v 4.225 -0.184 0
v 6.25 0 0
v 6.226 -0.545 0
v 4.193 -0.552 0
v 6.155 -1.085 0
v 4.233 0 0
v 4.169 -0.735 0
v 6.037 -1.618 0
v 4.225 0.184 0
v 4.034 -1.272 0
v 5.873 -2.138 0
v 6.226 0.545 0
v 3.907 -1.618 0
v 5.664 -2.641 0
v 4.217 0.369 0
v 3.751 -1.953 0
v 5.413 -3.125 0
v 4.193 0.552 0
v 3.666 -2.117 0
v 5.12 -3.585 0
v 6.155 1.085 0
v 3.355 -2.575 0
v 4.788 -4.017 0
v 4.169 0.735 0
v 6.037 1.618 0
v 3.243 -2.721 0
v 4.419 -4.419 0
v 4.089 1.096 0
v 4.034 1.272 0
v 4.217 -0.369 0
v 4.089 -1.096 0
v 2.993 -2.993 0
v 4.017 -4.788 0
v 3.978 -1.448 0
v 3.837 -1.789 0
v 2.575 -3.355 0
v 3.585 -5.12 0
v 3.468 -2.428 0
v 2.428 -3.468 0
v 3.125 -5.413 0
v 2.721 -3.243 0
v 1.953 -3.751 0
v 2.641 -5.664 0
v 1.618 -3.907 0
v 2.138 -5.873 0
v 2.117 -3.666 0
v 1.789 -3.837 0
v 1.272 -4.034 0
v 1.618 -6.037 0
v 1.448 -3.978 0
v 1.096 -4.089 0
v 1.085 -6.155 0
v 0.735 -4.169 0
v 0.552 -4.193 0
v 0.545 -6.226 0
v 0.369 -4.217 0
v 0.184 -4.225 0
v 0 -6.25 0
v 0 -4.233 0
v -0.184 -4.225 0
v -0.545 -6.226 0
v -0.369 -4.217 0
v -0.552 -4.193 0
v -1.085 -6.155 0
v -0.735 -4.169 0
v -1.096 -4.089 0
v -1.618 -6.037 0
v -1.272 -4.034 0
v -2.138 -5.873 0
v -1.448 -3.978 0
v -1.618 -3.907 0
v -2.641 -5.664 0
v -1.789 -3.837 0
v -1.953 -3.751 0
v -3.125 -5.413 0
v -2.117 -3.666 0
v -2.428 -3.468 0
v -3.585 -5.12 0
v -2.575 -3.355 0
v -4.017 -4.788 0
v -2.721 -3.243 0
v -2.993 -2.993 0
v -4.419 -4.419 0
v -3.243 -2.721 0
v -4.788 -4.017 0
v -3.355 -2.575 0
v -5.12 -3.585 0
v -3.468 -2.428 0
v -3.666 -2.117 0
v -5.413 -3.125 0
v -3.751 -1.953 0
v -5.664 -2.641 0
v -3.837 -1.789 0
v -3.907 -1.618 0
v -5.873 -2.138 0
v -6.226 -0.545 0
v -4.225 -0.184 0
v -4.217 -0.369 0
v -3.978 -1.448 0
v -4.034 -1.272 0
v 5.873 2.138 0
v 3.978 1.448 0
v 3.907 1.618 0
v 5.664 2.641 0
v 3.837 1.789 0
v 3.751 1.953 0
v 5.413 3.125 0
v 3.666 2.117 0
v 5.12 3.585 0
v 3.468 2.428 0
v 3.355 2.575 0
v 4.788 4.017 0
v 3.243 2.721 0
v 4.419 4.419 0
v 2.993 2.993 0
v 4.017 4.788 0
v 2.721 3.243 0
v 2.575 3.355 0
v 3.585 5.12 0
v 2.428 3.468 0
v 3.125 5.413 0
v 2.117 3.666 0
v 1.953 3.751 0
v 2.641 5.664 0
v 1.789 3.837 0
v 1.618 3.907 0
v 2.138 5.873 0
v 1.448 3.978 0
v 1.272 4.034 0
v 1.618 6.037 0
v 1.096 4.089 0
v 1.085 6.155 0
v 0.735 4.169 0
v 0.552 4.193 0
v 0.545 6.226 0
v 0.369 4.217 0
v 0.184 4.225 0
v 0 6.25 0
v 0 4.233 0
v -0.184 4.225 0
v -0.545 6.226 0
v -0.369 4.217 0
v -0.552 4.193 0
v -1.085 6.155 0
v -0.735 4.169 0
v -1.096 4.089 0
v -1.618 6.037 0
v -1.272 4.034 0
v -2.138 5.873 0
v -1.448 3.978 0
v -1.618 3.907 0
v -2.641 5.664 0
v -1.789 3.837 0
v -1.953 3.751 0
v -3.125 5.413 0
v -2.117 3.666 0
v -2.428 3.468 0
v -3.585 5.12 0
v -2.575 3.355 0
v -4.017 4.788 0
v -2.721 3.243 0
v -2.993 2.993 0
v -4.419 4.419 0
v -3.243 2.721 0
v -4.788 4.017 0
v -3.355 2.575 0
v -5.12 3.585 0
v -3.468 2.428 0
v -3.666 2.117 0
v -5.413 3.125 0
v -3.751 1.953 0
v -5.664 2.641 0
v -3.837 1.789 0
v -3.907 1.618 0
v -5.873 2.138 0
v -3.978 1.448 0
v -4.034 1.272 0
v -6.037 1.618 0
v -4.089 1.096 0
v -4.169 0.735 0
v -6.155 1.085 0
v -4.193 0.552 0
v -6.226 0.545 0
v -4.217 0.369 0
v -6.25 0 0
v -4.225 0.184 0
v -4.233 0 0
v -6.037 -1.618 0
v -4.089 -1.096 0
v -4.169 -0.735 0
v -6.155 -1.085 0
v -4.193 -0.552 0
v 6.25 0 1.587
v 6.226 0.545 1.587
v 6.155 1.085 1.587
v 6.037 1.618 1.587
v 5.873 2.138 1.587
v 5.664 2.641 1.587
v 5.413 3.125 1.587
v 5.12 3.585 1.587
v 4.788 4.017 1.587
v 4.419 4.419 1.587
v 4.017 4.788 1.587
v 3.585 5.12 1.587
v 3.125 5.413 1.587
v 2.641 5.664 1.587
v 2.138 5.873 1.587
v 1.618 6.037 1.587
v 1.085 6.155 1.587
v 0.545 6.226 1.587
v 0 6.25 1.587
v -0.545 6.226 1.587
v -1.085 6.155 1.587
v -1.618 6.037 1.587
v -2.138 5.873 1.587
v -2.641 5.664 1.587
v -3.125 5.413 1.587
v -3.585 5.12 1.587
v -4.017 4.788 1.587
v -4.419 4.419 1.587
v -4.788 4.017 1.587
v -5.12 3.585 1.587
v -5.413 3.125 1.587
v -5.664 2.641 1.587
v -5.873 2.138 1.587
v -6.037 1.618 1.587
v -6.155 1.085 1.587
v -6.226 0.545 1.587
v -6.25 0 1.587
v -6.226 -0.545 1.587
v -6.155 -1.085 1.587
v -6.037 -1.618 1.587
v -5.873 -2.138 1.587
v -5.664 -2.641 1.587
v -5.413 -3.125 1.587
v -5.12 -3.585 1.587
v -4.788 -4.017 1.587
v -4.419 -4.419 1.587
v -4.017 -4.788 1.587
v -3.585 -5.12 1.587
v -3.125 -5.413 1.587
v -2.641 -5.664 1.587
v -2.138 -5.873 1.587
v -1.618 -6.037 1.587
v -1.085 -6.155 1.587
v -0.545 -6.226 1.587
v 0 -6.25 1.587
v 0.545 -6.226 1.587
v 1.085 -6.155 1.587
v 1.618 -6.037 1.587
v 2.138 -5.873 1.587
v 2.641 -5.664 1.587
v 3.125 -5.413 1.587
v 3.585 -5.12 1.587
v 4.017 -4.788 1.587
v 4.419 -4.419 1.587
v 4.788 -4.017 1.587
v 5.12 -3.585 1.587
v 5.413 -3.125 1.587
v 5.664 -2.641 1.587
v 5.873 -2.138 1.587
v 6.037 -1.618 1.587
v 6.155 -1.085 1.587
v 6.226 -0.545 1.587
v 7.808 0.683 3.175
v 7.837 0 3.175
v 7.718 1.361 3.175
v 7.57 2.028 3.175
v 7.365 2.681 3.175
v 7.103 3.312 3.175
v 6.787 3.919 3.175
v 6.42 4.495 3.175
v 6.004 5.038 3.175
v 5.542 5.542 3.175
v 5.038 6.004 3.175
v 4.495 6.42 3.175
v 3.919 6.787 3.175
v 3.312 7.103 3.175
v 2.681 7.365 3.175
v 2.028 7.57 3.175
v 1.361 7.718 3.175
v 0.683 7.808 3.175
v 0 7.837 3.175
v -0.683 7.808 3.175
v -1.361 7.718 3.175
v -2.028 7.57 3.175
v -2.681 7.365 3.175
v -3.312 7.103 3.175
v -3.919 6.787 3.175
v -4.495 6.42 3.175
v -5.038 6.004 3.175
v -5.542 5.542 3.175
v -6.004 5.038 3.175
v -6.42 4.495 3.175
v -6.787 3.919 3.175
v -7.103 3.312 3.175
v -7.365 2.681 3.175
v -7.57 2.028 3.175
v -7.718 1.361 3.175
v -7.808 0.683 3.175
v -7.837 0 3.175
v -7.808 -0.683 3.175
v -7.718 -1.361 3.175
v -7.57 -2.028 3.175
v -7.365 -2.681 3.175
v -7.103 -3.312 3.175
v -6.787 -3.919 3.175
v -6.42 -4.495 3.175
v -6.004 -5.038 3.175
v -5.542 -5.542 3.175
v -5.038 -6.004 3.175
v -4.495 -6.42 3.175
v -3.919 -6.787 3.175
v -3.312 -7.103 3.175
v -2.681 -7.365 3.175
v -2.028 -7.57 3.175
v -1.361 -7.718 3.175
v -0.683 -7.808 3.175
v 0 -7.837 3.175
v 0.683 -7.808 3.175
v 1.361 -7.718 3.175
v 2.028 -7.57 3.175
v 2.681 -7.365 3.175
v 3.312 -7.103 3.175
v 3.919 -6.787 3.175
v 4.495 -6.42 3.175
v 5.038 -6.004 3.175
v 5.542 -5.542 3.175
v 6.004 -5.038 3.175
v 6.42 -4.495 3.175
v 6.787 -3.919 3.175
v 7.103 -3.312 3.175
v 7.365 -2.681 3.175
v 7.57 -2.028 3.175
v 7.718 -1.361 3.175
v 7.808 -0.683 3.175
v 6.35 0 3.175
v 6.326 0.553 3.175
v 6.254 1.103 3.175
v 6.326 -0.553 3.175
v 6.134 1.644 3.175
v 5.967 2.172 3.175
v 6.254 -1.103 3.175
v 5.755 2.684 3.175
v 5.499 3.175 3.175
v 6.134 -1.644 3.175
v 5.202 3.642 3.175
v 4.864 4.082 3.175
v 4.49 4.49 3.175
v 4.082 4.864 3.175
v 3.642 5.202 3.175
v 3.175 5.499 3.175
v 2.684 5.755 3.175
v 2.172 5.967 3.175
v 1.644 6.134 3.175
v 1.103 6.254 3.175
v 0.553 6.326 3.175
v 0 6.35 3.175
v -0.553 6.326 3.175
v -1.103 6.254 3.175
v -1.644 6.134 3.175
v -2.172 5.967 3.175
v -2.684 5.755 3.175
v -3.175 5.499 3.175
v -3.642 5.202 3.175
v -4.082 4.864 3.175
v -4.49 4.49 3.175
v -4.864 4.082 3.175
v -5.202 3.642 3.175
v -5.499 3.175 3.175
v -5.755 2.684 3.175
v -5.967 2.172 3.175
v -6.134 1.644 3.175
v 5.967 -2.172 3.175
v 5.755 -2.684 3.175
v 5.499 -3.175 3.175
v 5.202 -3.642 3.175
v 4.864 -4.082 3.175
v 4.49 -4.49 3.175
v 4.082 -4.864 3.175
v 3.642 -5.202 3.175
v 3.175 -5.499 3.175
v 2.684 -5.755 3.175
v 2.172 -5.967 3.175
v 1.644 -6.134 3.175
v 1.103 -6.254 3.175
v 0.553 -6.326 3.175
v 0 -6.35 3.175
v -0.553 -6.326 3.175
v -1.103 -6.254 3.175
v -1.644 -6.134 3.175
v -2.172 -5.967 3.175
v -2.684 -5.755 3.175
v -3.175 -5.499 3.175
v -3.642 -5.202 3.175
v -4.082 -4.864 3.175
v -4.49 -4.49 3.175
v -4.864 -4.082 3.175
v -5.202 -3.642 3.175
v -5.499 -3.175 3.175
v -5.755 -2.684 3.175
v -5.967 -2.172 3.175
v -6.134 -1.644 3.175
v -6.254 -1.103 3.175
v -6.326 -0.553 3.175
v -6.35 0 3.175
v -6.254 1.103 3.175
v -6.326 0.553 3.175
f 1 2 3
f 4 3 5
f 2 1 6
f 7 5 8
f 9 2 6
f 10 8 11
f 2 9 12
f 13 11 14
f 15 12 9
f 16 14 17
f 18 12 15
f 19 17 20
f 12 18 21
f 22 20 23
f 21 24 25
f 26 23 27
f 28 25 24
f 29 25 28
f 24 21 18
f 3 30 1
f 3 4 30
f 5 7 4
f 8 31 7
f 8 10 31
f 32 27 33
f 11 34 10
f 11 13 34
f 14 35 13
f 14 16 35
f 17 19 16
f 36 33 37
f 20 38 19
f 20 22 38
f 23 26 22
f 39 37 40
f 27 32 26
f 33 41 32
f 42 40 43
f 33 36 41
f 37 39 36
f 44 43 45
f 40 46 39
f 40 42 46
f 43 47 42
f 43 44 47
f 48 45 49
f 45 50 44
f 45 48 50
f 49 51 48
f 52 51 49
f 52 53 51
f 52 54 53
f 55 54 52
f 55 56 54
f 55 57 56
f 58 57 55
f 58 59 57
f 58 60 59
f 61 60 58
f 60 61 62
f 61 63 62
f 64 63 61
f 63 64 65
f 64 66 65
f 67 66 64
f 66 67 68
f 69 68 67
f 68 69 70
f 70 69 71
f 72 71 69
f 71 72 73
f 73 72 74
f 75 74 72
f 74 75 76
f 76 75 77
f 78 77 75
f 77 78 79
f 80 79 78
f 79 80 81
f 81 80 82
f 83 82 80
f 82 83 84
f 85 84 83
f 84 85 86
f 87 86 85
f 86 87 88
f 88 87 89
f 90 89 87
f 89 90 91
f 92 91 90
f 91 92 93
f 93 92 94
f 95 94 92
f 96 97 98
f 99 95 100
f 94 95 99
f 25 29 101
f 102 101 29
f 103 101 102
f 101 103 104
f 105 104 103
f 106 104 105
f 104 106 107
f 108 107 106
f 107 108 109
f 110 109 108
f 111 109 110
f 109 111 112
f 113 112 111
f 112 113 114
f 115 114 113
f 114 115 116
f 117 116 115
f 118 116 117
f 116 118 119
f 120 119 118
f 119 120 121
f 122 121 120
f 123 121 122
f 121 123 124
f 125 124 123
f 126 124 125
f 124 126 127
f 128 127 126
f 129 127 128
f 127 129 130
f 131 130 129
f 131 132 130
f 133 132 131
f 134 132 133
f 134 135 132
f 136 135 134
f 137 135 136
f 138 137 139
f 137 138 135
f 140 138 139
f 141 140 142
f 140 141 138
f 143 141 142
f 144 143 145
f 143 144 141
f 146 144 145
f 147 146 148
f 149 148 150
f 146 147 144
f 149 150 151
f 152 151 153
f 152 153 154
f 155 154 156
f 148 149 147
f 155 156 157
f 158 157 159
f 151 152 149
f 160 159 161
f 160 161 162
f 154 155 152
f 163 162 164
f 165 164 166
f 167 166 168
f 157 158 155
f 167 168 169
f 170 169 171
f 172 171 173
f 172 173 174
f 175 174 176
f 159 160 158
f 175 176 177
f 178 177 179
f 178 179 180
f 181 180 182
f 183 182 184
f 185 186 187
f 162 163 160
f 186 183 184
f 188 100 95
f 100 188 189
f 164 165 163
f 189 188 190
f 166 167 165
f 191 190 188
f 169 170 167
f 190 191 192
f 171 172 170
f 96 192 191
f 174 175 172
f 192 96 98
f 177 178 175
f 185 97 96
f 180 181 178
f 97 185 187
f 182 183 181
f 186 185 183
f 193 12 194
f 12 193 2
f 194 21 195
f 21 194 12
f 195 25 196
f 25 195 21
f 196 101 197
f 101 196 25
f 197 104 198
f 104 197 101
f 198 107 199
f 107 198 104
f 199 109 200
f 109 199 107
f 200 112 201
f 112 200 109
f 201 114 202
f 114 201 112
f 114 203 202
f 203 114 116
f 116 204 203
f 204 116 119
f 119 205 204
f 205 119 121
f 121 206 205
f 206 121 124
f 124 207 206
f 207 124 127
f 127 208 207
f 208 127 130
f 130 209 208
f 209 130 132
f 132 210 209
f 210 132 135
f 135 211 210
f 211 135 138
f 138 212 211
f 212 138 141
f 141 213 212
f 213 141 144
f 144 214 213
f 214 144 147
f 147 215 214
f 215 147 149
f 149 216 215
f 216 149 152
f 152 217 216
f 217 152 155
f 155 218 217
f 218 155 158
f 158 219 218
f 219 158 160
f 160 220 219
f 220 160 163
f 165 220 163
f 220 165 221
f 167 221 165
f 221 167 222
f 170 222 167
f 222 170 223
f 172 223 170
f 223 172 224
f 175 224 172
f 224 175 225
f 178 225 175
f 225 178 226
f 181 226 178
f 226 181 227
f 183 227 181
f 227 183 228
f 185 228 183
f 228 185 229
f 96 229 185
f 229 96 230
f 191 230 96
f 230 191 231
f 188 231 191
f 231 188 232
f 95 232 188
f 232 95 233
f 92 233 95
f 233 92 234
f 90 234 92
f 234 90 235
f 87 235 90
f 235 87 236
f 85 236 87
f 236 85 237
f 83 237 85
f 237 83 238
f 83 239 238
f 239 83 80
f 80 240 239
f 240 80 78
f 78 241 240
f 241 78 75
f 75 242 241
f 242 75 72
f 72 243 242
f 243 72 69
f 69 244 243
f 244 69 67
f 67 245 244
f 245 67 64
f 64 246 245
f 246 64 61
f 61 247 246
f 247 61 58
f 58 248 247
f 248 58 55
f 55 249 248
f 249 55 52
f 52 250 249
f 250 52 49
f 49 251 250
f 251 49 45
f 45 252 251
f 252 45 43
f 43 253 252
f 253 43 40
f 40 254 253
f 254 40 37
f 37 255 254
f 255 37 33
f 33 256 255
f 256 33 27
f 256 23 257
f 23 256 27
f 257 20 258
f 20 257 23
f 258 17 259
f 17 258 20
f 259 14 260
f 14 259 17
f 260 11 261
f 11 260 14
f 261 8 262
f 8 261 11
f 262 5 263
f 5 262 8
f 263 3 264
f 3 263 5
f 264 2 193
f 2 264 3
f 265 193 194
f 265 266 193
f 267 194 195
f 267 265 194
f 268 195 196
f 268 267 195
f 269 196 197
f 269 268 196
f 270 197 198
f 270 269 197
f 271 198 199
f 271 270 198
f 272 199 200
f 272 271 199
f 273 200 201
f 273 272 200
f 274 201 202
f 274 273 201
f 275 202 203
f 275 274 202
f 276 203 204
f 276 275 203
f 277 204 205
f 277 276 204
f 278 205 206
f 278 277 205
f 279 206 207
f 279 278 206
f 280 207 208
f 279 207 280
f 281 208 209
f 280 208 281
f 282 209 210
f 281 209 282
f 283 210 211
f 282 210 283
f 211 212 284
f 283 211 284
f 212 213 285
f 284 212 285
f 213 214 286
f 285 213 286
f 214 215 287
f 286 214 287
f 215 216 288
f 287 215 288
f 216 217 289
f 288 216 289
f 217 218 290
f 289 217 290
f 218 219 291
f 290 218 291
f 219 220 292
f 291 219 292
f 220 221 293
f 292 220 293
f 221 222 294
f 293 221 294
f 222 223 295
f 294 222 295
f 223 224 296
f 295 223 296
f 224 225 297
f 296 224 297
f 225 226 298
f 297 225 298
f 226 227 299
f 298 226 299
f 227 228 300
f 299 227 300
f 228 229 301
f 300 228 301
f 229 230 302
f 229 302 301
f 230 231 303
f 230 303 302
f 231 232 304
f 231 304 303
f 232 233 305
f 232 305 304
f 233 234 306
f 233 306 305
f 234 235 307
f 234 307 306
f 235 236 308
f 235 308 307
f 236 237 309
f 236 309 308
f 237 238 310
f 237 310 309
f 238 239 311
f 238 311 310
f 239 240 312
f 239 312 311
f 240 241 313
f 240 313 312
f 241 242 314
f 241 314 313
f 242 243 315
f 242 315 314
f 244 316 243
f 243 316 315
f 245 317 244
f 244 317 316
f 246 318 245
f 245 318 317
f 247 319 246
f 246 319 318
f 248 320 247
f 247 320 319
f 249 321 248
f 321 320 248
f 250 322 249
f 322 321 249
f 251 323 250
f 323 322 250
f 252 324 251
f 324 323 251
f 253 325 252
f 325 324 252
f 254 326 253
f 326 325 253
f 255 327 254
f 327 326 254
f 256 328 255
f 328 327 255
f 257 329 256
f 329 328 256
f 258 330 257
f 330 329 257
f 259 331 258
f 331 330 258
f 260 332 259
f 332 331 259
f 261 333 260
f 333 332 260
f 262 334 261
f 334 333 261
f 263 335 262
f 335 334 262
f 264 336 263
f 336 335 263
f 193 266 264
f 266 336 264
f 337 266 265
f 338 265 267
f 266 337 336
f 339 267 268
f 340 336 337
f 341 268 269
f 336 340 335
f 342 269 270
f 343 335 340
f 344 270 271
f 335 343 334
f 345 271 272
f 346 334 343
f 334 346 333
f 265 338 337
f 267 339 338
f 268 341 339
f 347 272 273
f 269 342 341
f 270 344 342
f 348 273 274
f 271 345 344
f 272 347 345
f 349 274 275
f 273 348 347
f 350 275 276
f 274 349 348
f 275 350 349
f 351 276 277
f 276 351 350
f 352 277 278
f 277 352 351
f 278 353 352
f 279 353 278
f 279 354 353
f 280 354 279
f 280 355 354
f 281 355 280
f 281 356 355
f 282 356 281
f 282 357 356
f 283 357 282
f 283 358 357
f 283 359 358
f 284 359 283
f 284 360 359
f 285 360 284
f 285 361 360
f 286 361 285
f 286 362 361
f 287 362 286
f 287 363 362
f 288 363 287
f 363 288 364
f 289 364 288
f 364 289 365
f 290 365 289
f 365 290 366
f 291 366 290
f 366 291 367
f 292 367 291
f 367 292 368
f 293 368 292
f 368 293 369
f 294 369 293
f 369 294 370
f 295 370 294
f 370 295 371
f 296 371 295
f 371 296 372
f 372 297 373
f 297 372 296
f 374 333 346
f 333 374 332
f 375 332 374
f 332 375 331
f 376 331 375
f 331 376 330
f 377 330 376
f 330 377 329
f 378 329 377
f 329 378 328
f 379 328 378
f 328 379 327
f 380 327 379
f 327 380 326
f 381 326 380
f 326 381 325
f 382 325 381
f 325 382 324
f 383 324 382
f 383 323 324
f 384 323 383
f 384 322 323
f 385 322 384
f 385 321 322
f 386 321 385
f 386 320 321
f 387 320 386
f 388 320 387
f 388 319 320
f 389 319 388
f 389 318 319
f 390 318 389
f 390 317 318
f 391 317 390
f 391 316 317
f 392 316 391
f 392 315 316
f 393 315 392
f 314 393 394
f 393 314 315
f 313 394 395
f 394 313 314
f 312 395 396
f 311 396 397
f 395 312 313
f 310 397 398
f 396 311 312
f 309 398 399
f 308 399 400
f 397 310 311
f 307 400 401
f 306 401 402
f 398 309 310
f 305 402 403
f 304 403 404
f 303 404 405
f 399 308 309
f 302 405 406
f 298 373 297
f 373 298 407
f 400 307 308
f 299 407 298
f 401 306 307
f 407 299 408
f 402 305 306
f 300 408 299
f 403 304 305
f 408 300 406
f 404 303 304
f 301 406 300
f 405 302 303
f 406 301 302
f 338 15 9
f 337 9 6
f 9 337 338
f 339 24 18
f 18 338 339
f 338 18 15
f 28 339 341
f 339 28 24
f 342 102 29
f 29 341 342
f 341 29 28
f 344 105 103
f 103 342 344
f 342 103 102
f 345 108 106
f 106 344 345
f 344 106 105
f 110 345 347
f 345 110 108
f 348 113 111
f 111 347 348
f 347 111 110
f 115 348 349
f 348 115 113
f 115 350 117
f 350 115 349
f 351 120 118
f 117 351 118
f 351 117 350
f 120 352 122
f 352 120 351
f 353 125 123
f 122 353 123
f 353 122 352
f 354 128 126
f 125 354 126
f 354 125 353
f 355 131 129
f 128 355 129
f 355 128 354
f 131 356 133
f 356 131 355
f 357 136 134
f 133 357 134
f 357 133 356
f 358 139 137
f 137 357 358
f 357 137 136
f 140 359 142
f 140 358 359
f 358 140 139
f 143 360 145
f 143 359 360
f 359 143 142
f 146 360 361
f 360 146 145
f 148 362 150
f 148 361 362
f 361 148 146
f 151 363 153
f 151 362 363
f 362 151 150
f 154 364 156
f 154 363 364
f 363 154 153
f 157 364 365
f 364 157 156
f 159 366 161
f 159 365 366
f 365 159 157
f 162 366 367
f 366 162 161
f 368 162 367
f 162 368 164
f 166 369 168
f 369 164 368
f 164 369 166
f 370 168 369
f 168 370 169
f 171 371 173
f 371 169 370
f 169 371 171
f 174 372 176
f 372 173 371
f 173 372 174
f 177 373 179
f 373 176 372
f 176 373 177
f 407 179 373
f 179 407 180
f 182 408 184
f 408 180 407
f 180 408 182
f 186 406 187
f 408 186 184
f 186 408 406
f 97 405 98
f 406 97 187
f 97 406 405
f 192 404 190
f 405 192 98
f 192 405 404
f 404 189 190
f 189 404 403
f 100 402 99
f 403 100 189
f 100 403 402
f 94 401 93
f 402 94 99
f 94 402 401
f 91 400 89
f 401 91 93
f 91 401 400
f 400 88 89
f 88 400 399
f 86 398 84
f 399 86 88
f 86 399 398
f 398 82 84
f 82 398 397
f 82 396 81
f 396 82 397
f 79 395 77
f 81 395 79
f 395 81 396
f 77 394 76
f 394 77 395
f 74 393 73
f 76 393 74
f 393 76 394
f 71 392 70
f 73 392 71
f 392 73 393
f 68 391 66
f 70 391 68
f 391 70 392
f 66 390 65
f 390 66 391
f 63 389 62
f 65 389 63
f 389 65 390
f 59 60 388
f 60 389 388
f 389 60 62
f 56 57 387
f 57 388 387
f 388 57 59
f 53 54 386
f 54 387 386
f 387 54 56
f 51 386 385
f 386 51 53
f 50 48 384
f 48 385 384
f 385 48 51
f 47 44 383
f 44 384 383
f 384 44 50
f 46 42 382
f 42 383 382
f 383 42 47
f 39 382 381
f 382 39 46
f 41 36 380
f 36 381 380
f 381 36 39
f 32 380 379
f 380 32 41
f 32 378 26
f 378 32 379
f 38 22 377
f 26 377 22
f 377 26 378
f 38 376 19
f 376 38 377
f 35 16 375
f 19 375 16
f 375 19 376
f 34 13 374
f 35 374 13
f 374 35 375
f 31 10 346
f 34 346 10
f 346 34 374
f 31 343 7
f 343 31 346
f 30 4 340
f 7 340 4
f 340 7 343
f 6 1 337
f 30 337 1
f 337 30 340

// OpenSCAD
// file: ../lib/TOGUnitTable-v1.scad
// TOGUnitTable-v1.1.0 - Library for handling 'complex amounts' in the form of [multiplier, unit name], e.g. [1.5, "inch"]
//
// 2023-07-01: the following 'annotation' is something I just made up,
// but is intended as a way for future packaging tools to know that it's 'safe'
// (because everything has been somewhat namespaced) to turn a `use <x>`
// into an `include <x>`, making it inlinable:
// safe-to-include: true
// 
// Versions:
// v1.0.0:
// - Created it.
// v1.1.0:
// - Add optional 'dbgctxstr' parameter to unit decoding functions, for better error messages
// 
// Naming convention:
// Doing 'OO without classes', here.
// Fully qualified name = class or package name + "__" + member name
// Class or package name may itself be namespaced, and class names may double as package names.
// Here, tog_unittable names both a class and a package.

// Demo unit table uses 'micrometer' as the base unit
// in order to keep multipliers as integers as much as possible.
tog_unittable__demo_unit_table = [
	["um",    [    1   ,   "um"], "micrometer" ],
	["mm",    [ 1000   ,   "um"], "millimeter" ],
	["inch",  [25400   ,   "um"], "inch"       ],
	["u",     [    1/16, "inch"], "model unit" ], // As used by TGx9 et al
	["atom",  [    8   ,    "u"], "model atom" ],
	["chunk", [    3   , "atom"], "model chunk"],
];

use <./DbgCtxStrLib1.scad>

function tog_unittable__list__filter(list, predicate) = [
	for( item=list ) if( predicate(item) ) item
];
function tog_unittable__list__first(list, on_error) =
	len(list) > 0 ? list[0] : on_error();

function tog_unittable__unit_value_ca(unit_table, unit_name, dbgctxstr=undef) =
	tog_unittable__list__first(
		tog_unittable__list__filter(unit_table, function (entry) entry[0] == unit_name),
		function () assert(false,
			str("Did not find entry for unit '", unit_name, "' in unit table", dbgctxstr_errmsg_suffix(dbgctxstr))
		)
	)[1];

function tog_unittable__ca__is_valid( ca ) =
	is_list(ca) && len(ca) == 2;

// Break down 'amount' until it is in a base unit (one which is defined in terms of itself)
function tog_unittable__simplify_ca(unit_table, amount, dbgctxstr=undef) =
	assert( tog_unittable__ca__is_valid(amount), str(amount, " is not a valid Complex Amount (should be [numeric_value, \"unit_name\"])", dbgctxstr=dbgctxstr) )
	let( unit_value_ca = tog_unittable__unit_value_ca(unit_table, amount[1], dbgctxstr=dbgctxstr) )
	unit_value_ca[1] == amount[1] ? amount :
		tog_unittable__simplify_ca(unit_table, [amount[0] * unit_value_ca[0], unit_value_ca[1]]);

function tog_unittable__divide_ca(unit_table, numerator, denominator, dbgctxstr=undef) =
	let(
		numerator_base_ca   = tog_unittable__simplify_ca(unit_table, numerator, dbgctxstr=dbgctxstr),
		denominator_base_ca = tog_unittable__simplify_ca(unit_table, denominator, dbgctxstr=dbgctxstr)
	)
	assert(numerator_base_ca[1] == denominator_base_ca[1], str("Different base units found for ", numerator[1], " and ", denominator[1]))
	numerator_base_ca[0] / denominator_base_ca[0];	

assert(tog_unittable__divide_ca(tog_unittable__demo_unit_table, [1,   "mm"], [  1, "mm"]) ==     1   );
assert(tog_unittable__divide_ca(tog_unittable__demo_unit_table, [1,   "mm"], [  1, "um"]) ==  1000   );
assert(tog_unittable__divide_ca(tog_unittable__demo_unit_table, [1, "inch"], [  1, "um"]) == 25400   );
assert(tog_unittable__divide_ca(tog_unittable__demo_unit_table, [1, "inch"], [  1, "mm"]) ==    25.4 );
assert(tog_unittable__divide_ca(tog_unittable__demo_unit_table, [1, "inch"], [254, "um"]) ==   100   );
assert(tog_unittable__divide_ca(tog_unittable__demo_unit_table, [1,    "u"], [  1, "um"]) ==  1587.5 );
// file: ../lib/TOGStringLib1.scad
// TOGStringLib1.7
// 
// Functions for parsing quantities
// and other misc. string handling.
// 
// v1.5
// - togstr1_parse_quantity will treat unit-only strings as meaning 1/1 of that unit.
//   e.g. togstr1_parse_quantity("foot") = [[[1,1], "foot", 4]]
// v1.6:
// - togstr1_parse_quantity allows unit name to be omitted when quantity is zero and $togunits1_default_unit is defined
// v1.7:
// - Add optional 'dbgctxstr' parameter to unit decoding functions, for better error messages
// 
// Globals: $togunits1_default_unit - affects what 'unit' is returned
// when interpreting numbers or strings that lack the unit.


function togstr1__todo(message) = assert(false, str("TODO: ", message));

module togstr1__assert_eq(a, b) {
	if( a != b ) {
		assert( a == b, str(a, " != ", b) );
	}
}



function togstr1_slice(source, i0, i1) =
	i0 == i1 ? "" :
	str(source[i0], togstr1_slice(source, i0+1, i1));

function togstr1_tokenize(source, sep, maxcount=9999, i=0, tokenstart=0) =
	len(source) == i ? (
		(tokenstart < i) ? [togstr1_slice(source, tokenstart, i)] : []
	) :
	source[i] == sep ? (
		(tokenstart < i) ? concat([togstr1_slice(source, tokenstart, i)], togstr1_tokenize(source, sep, maxcount-1, i+1, i+1)) :
		togstr1_tokenize(source, sep, maxcount, i+1, i+1)
	) :
	maxcount <= 1 ? [togstr1_slice(source, tokenstart, len(source))] :
	togstr1_tokenize(source, sep, maxcount, i+1, tokenstart);

togstr1__assert_eq( ["foo","bar","baz"], togstr1_tokenize("foo-bar-baz", "-") );
// Duplicate delimiters are ignored
togstr1__assert_eq( ["foo","bar","baz"], togstr1_tokenize("foo--bar--baz", "-") );
// Trailing delimiters are ignored
togstr1__assert_eq( ["foo","bar","baz"], togstr1_tokenize("foo--bar--baz--", "-") );
// Leading delimiters are ignored
togstr1__assert_eq( ["foo","bar","baz"], togstr1_tokenize("--foo--bar--baz", "-") );
// Can limit number of tokens returned
togstr1__assert_eq( ["foo","bar-baz"], togstr1_tokenize("foo-bar-baz", "-", 2) );
togstr1__assert_eq( ["foo","bar-baz"], togstr1_tokenize("--foo--bar-baz", "-", 2) );
togstr1__assert_eq( ["foo","bar--baz"], togstr1_tokenize("--foo--bar--baz", "-", 2) );
togstr1__assert_eq( ["foo"], togstr1_tokenize("--foo--", "-", 2) );




/** \d+ -> [num, end_index] */
function togstr1_parse_decimal_nat(str, index=0, current=0, dbgctxstr=undef) =
	len(str) == index ? [current, index] :
	let( dig = ord(str[index]) - ord("0") )
	(dig >= 0 && dig <= 9) ? togstr1_parse_decimal_nat(str, index+1, current*10 + dig, dbgctxstr=dbgctxstr) :
	[current, index];

togstr1__assert_eq( [123,3], togstr1_parse_decimal_nat("123") );
togstr1__assert_eq( [123,3], togstr1_parse_decimal_nat("123.45") );

/** [+-]*\d+ ->  [[num, den], end_index] */
function togstr1_parse_decimal_number(str, index=0, dbgctxstr=undef) =
	str[index] == "+" ? togstr1_parse_decimal_number(str, index+1) :
	str[index] == "-" ? let(r=togstr1_parse_decimal_number(str, index+1)) [[-r[0][0], r[0][1]], r[1]] :
	let(r = togstr1_parse_decimal_nat(str, index, dbgctxstr=dbgctxstr))
	str[r[1]] != "." ? [[r[0], 1], r[1]] :
	let(fracr = togstr1_parse_decimal_nat(str, r[1]+1))
	let(mult = pow(10, fracr[1]-(r[1]+1)))
	[[r[0]*mult + fracr[0], mult], fracr[1]];

togstr1__assert_eq( [[   36,   1], 2], togstr1_parse_decimal_number( "36"   ) );
togstr1__assert_eq( [[ 3524, 100], 5], togstr1_parse_decimal_number( "35.24") );
togstr1__assert_eq( [[-3524, 100], 6], togstr1_parse_decimal_number("-35.24") );
togstr1__assert_eq( [[    0,   1], 0], togstr1_parse_decimal_number( "NotANumber") );

function togstr1__gcd(a, b) = b == 0 ? abs(a) : togstr1__gcd(b, a % b);

togstr1__assert_eq(10, togstr1__gcd(10, 20));
togstr1__assert_eq( 5, togstr1__gcd(10, 15));
togstr1__assert_eq( 2, togstr1__gcd(10, 14));


function togstr1__normalize_rat(rat) =
	let(gcd = togstr1__gcd(rat[0], rat[1]))
	// TODO: find LCD, divide top and bottom by it
	rat[0] < 0 && rat[1] < 0 ? [-rat[0]/gcd, -rat[1]/gcd] :
	[rat[0]/gcd, rat[1]/gcd];

/** <decnum>[/<decnum>] -> [[num, den], end_index] */
function togstr1__multiply_rat(a, b) =
	togstr1__normalize_rat(
		a[1] == b[1] ? [a[0]*b[0]/a[1], a[1]] : // TODO: LCD instead of special case
		[a[0]*b[0], a[1]*b[1]]
	);
function togstr1__divide_rat(a, b) = togstr1__normalize_rat([a[0]*b[1], a[1]*b[0]]);


function togstr1__add_rat(a, b) =
	togstr1__normalize_rat([a[0]*b[1] + b[0]*a[1], a[1]*b[1]]);
	
togstr1__assert_eq([1, 2], togstr1__add_rat([1, 3], [1, 6]));


/** Return [[num, den], end_index] */
function togstr1_parse_rational_number(str, index=0, dbgctxstr=undef) =
	let( numr = togstr1_parse_decimal_number(str, index, dbgctxstr=dbgctxstr) )
	str[numr[1]] == "+" ?
		let(numrb = togstr1_parse_rational_number(str, numr[1]+1, dbgctxstr=dbgctxstr))
		[togstr1__add_rat(numr[0], numrb[0]), numrb[1]]	:
	str[numr[1]] == "/" ?
		let( denr = togstr1_parse_decimal_number(str, numr[1]+1, dbgctxstr=dbgctxstr) )
		[togstr1__divide_rat(numr[0], denr[0]), denr[1]] :
	numr;

togstr1__assert_eq( [[   123,  1],3], togstr1_parse_rational_number( "123") );
togstr1__assert_eq( [[   123,  1],4], togstr1_parse_rational_number("+123") );
togstr1__assert_eq( [[-  123,  1],4], togstr1_parse_rational_number("-123") );
togstr1__assert_eq( [[   123,  1],6], togstr1_parse_rational_number("-+-123") );
togstr1__assert_eq( [[ 12345,100],6], togstr1_parse_rational_number("123.45") );
togstr1__assert_eq( [[  2469, 40],8], togstr1_parse_rational_number("123.45/2") );
togstr1__assert_eq( [[-  823,160],10], togstr1_parse_rational_number("-123.45/24") );
togstr1__assert_eq( [[     4,  3],5], togstr1_parse_rational_number( "1+1/3") );
togstr1__assert_eq( [[     0,  1],0], togstr1_parse_rational_number( "NotANumber!!") );


/** Return [[[num, den], unit], end_index] */
function togstr1_parse_quantity(str, dbgctxstr=undef) =
	let( numr = togstr1_parse_rational_number(str, dbgctxstr=dbgctxstr) )
	// For now, just let the unit be the rest of the string;
	// can revisit to stop at delimiters if needed in the future.
	numr[1] > 0 && numr[1] == len(str) && numr[0][0] == 0 && !is_undef($togunits1_default_unit) ? [[[0,1], $togunits1_default_unit], numr[1]] :
	assert( numr[1] < len(str), str("Quantity string missing unit: '", str, "'; note that '0' is acceptable if $togunits1_default_unit is defined"))
	let( unit = togstr1_slice(str, numr[1], len(str)) )
	let( quant = numr[1] > 0 ? numr[0] : [1,1] ) // No number = 1 (possibly this should be an error instead)
	[[quant, unit], len(str)];

togstr1__assert_eq( [[[  3,  1], "acre"],  5], togstr1_parse_quantity("3acre") );
togstr1__assert_eq( [[[  3,  5], "acre"],  7], togstr1_parse_quantity("3/5acre") );
togstr1__assert_eq( [[[301,500], "acre"], 10], togstr1_parse_quantity("3.01/5acre") );
togstr1__assert_eq( [[[  1,  1], "acre"],  4], togstr1_parse_quantity("acre") ); // Should either treat as one or throw an error!
togstr1__assert_eq( [[[  0,  1],"hectare"],1], togstr1_parse_quantity("0", $togunits1_default_unit="hectare") ); // Zero is fine if $togunits1_default_unit is defined
// file: ../lib/TOGridLib3.scad
// TOGridPileLib-v3.4
// 
// HOKAY WHAT ARE THE COMMON
// things that I want the library to do?
// 
// - [X] Be `include`-able, to make inlining easy
// - [X] Allow unit table to be overridden easily, but default by default
// - [ ] Support common configurations by name (e.g. "V9", or some "WSTYPE-...")
//   without having to pass 50 different parameters in
// - [ ] Support subtractions for those common configurations also,
//   such that you don't need to remember to 'do less rounding', etc.
// - [ ] Make a simple foot-only block that I can subtract stuff from
//   params: foot style
// - [ ] Make a block with a lip
// - [ ] Make a block foot, and I'll intersect it with some other things
// - [X] Translate a block_size_ca to mm
// 
// Changes:
// v3.1:
// - s/togridpile3_decode_size/togridpile3_decode_vector/
// v3.2:
// - togridpile3_decode(num) = num
// v3.3:
// - Change prefix from `togridpile3` to `togridlib3`
// v3.4:
// - Add optional 'dbgctxstr' parameter to unit decoding functions, for better error messages

use <../lib/TOGUnitTable-v1.scad>

function togridlib3_map(arr, fn) = [ for(item=arr) fn(item) ];

togridlib3_default_unit_table = [
	["um",    [    1,               "um"]],
	["mm",    [ 1000,               "um"]],
	["inch",  [25400,               "um"]],
	["u",     [    1.5875,          "mm"]],
	["atom",  [    8,                "u"]],
	["chunk", [    3,             "atom"]],
	["tgp-standard-bevel"   , [2,    "u"]], // Usuually 1/8"
	["m-outer-corner-radius", [4,    "u"]],
	["f-outer-corner-radius", [3,    "u"]],
];

function togridlib3_get_default_unit_table() = togridlib3_default_unit_table;
function togridlib3_get_unit_table() = is_undef($togridlib3_unit_table) ? togridlib3_default_unit_table : $togridlib3_unit_table;

function togridlib3_decode(dim, unit=[1, "mm"], unit_table=togridlib3_get_unit_table(), dbgctxstr=undef) =
	is_num(dim) ? dim : tog_unittable__divide_ca(unit_table, dim, unit, dbgctxstr=dbgctxstr);
function togridlib3_decode_vector(size, unit=[1, "mm"], unit_table=togridlib3_get_unit_table(), dbgctxstr=undef) =
	togridlib3_map(size, function(dim) is_num(dim) ? dim : tog_unittable__divide_ca(unit_table, dim, unit, dbgctxstr=dbgctxstr));

module togridlib3_cube(size, offset=0) {
	cube(togridlib3_decode_vector(size), center=true);
}
// file: ../lib/DbgCtxStrLib1.scad
// DbgCtxStrLib1.0
// 
// Library for dealing with 'debug context strings' (usually 'dbgctxstr').

function dbgctxstr_errmsg_suffix(dbgctxstr) =
	is_undef(dbgctxstr) || dbgctxstr == "" ? "" :
	str(" (", dbgctxstr, ")");
// file: ../lib/TOGMod1Constructors.scad
// TOGMod1Constructors-v1.11
// 
// Functions to construct objects understood by TOGMod1
// 
// v1.1:
// - Add togmod1_make_rounded_rect
// v1.2:
// - togmod1_make_rounded_rect can make ovals
// v1.3:
// - togmod1_circle_points, to just get the points of a circle
// - if pos parameter to circle function has a third element,
//   returned vertexes will include it as the z component;
// v1.3.1
// - Some assertions
// v1.4:
// - Refactor togmod1_rounded_rect_points and togmod1_circle_points
//   to use togmod1__make_nd_vector_adder for adapting to whatever
//   `pos` parameter is.
// v1.5:
// - togmod_rounded_rect_points will not simplify completely rounded sides
//   (where length of side is exactly twice the rounding radius)
//   unless simplify_rounded_sides=true
//   - This makes it more useful for polyhedron generation,
//     where radius varies, but number of points must remain constant.
// v1.6:
// - togmod1_make_rect makes a simple rectangle
// - togmod1_make_rounded_rect will defer to togmod1_make_rect when r=0
// v1.7:
// - togmod1_make_circle will return empty shape (["union"]) when d=0
// v1.8:
// - Add togmod1_text
// v1.9:
// - togmod1_circle_points uses 3 as minimum circle point count instead of 6
// v1.10:
// - Fix togmod1_linear_extrude_y so that range corresponds to Y start/end and
//   polygon X,Y correspond to X,Z.  Previously it was rotated wrongly,
//   which would have gone unnoticed for symmetrical shapes centered at 0,0.
// v1.11:
// - Remove an 'echo'

use <./TOGArrayLib1.scad>

function togmod1__make_nd_vector_adder(origin=[0,0]) =
	let(origin_is_zero = tal1_reduce(true, origin, function(prev,item) prev && item == 0))
	origin_is_zero ? (function(vec) len(vec) >= len(origin) ? vec : tal1_replace_at(origin, 0, vec)) :
	function(vec) [
		for(i=[0:1:max(len(origin),len(vec))-1]) (len(vec) > i ? vec[i] : 0) + (len(origin) > i ? origin[i] : 0),
	];

assert([1,2,3] == togmod1__make_nd_vector_adder()([1,2,3]));
assert([1,2,3] == togmod1__make_nd_vector_adder([0,0,3])([1,2]));


function togmod1_make_cuboid(size) =
	assert(is_list(size))
	assert(len(size) >= 3)
	assert(is_num(size[0]))
	assert(is_num(size[1]))
	assert(is_num(size[2]))
	["polyhedron-vf", [
		[-size[0]/2, -size[1]/2, -size[2]/2],
		[+size[0]/2, -size[1]/2, -size[2]/2],
		[-size[0]/2, +size[1]/2, -size[2]/2],
		[+size[0]/2, +size[1]/2, -size[2]/2],
		[-size[0]/2, -size[1]/2, +size[2]/2],
		[+size[0]/2, -size[1]/2, +size[2]/2],
		[-size[0]/2, +size[1]/2, +size[2]/2],
		[+size[0]/2, +size[1]/2, +size[2]/2]
	], [
		[0,1,3,2],[0,4,5,1],[4,6,7,5],[3,7,6,2],[1,5,7,3],[6,4,0,2]
	]];

function togmod1_make_polygon(verts) =
	["polygon-vp", verts, [[for( i=[0:1:len(verts)-1] ) i%len(verts)]]];

function togmod1_rounded_rect_points(size, r, pos=[0,0], simplify_rounded_sides=false) =
	assert(is_list(size))
	assert(len(size) >= 2)
	let(radii = is_list(r) ? r : is_num(r) ? [r,r] : assert(false, "rounded_rect r(adius) should be list<num> or num"))
	let(rx = radii[0])
	let(ry = radii[1])
	assert(is_num(rx))
	assert(is_num(ry))
	assert(size[0] >= 2*rx, str("size[0] must be >= 2*r[0]; size[0] = ",size[0],", 2*r[0] = ",2*rx))
	assert(size[1] >= 2*ry, str("size[1] must be >= 2*r[1]; size[1] = ",size[1],", 2*r[1] = ",2*ry))
	let(quarterfn=max($fn/4, 1))
	let(qfnx = simplify_rounded_sides && size[0] == 2*rx ? quarterfn-1 : quarterfn)
	let(qfny = simplify_rounded_sides && size[1] == 2*ry ? quarterfn-1 : quarterfn)
	let(finalizepos = togmod1__make_nd_vector_adder(pos))
[
	for(a=[0 : 1 : qfnx]) let(ang=      a*90/quarterfn) finalizepos([ size[0]/2-rx + rx*cos(ang),  size[1]/2-ry + ry*sin(ang)]),
	for(a=[0 : 1 : qfny]) let(ang= 90 + a*90/quarterfn) finalizepos([-size[0]/2+rx + rx*cos(ang),  size[1]/2-ry + ry*sin(ang)]),
	for(a=[0 : 1 : qfnx]) let(ang=180 + a*90/quarterfn) finalizepos([-size[0]/2+rx + rx*cos(ang), -size[1]/2+ry + ry*sin(ang)]),
	for(a=[0 : 1 : qfny]) let(ang=270 + a*90/quarterfn) finalizepos([ size[0]/2-rx + rx*cos(ang), -size[1]/2+ry + ry*sin(ang)]),
];

function togmod1_make_rect(size) =
	togmod1_make_polygon([
		[-size[0]/2, -size[1]/2],
		[+size[0]/2, -size[1]/2],
		[+size[0]/2, +size[1]/2],
		[-size[0]/2, +size[1]/2],
	]);

function togmod1_make_rounded_rect(size, r) =
	r == 0 ? togmod1_make_rect(size) :
	togmod1_make_polygon(togmod1_rounded_rect_points(size,r,simplify_rounded_sides=true));

/**
 * Returns points for an approximation of a circle where points are at distance r from pos.
 * Can be used to make other regular polygons, but the faces will be less than that
 * distance from pos (do some trig if you want face distance, e.g. for a hex nut).
 */
function togmod1_circle_points(r, pos=[0,0], d=undef) =
	assert( !is_undef(r) || !is_undef(d) )
	assert(!is_undef(pos[0]))
	assert(!is_undef(pos[1]))
	let(finalizepos = togmod1__make_nd_vector_adder(pos))
	let(r_ = !is_undef(r) ? r : d/2)
	let(fn = max($fn, 3))
	[for(i=[0 : 1 : fn-1]) finalizepos([r_*cos(i*360/fn), r_*sin(i*360/fn)])];

function togmod1_make_circle(r, pos=[0,0], d=undef) =
	r == 0 || d == 0 ? ["union"] :
	togmod1_make_polygon(togmod1_circle_points(r=r, pos=pos, d=d));

function togmod1_make_cylinder(d, zrange=[0,1], r=undef, pos=[0,0]) =
	assert( !is_undef(r) || !is_undef(d) )
	let( r_ = !is_undef(r) ? r : d/2 )
	// TODO: Make polyhedron directly
	["linear-extrude-zs", zrange, togmod1_make_circle(r=r_, pos=pos)];

function togmod1__is_range1d(range) = is_list(range) && len(range) == 2 && is_num(range[0]) && is_num(range[1]);

function togmod1_linear_extrude_z(range, shape) =
	assert(togmod1__is_range1d(range))
	["linear-extrude-zs", range, shape];
function togmod1_linear_extrude_x(range, shape) =
	assert(togmod1__is_range1d(range))
	["rotate", [90, 0, 90], togmod1_linear_extrude_z(range, shape)];
function togmod1_linear_extrude_y(range, shape) =
	assert(togmod1__is_range1d(range))
	["rotate", [90, 0,  0], togmod1_linear_extrude_z([-range[1], -range[0]], shape)];

function togmod1_text(text, size, font, halign, valign, spacing, direction, language, script) =
	["text-tsfhvsdls", text, size, font, halign, valign, spacing, direction, language, script];
// file: ../lib/TOGArrayLib1.scad
// TOGArrayLib1.5
// 
// Functions for working with arrays.
// 
// v1.1:
// - tal1_reduce assert(is_list(items)) to prevent infinite recursion
//   when given undefined or other non-list values
// v1.1.1:
// - Fix tal1_uniq_remap_v2 to return "list-remap-result" as the
//   first element of the returned list
// v1.2:
// - Add tal1_replace_at function
// v1.3:
// - tal1_is_vec_of, tal1_is_vec_of_num
// v1.4:
// - tal1_assert_for_each, for when you want to assert something
//   about each of a list of items and get nice failure messages
// v1.5:
// - Add tal1_duplicate_reversed function, which may be
//   handy when generating symmetrical polygons and stuff.

/**
 * Make a list with the contents of list `a`,
 * but starting at offset `off`, replaced by the contents of list `b`.
 * len(result) = max(len(a), off+len(b))
 */
function tal1_replace_at(a, off, b, default_value=undef, default_value_function=undef) =
	assert(is_list(a))
	assert(is_list(b))
	let( _dvf = !is_undef(default_value_function) ? default_value_function : function(i) default_value )
[
	for( i=[0:1:min(off,len(a))-1] ) a[i],
	for( i=[len(a):1:off-1] ) _dvf(i),
	for( i=[off:1:off+len(b)-1] ) b[i-off],
	for( i=[off+len(b):1:len(a)-1] ) a[i],
];

// Simplest case
assert([] == tal1_replace_at([], 0, []));
// Second simplest cases
assert(["foo"] == tal1_replace_at(["foo"], 0, []));
assert(["foo"] == tal1_replace_at([], 0, ["foo"]));
// Replace one item
assert(["foo","quux","baz"] == tal1_replace_at(["foo","bar","baz"], 1, ["quux"]));
// Replace and extend
assert(["foo","quux","tuna","tina"] == tal1_replace_at(["foo","bar","baz"], 1, ["quux", "tuna", "tina"]));
// Add beyond end of `a`
assert(["foo","zzz","quux"] == tal1_replace_at(["foo"], 2, ["quux"], default_value="zzz"));
// Adding 'nothing' should still fill to that point with defaults
assert(["foo","zzz","zzz"] == tal1_replace_at(["foo"], 3, [], default_value="zzz"));


function tal1_reduce(start, items, func, offset=0) =
	assert(is_list(items))
	len(items) == offset ? start :
	tal1_reduce(func(start, items[offset]), items, func, offset+1);

function tal1_consecutive_duplicate_count(items) = tal1_reduce(
	[0, undef],
	items,
	function(z,item) [z[0] + (item == z[1] ? 1 : 0), item]
)[0];

assert(0 == tal1_consecutive_duplicate_count([]));
assert(0 == tal1_consecutive_duplicate_count([50]));
assert(1 == tal1_consecutive_duplicate_count([50,50]));
assert(0 == tal1_consecutive_duplicate_count([50,51,52,53]));
assert(1 == tal1_consecutive_duplicate_count([50,51,52,52]));
assert(3 == tal1_consecutive_duplicate_count([50,50,50,50]));

// Set test_size to arbirarily large values
// to ensure that OpenSCAD can handle heavy recursion
let(test_size=1000) assert(test_size/2 == tal1_consecutive_duplicate_count([for(i=[0:1:test_size-1]) floor(i/2)]));



function tal1_uniq_(items, off0, off1) =
	let(chunklen = off1-off0)
	chunklen == 0 ? [] :
	chunklen == 1 ? [items[off0]] :
	let(half=floor(chunklen/2))
	let(left  = tal1_uniq_(items, off0     , off0+half))
	let(right = tal1_uniq_(items, off0+half, off1     ))
	assert(len(left) > 0)
	assert(len(right) > 0)
	left[len(left)-1] == right[0] ? [each left, for(i=[1:1:len(right)-1]) right[i]] :
	[each left, each right];

/** Given a list of items, returns a new list with identical consecutive items merged */
function tal1_uniq(items) = tal1_uniq_(items, 0, len(items));

assert([] == tal1_uniq([]));
assert([123] == tal1_uniq([123]));
assert([55,0,1,2,3] == tal1_uniq([55,0,1,2,3]));
assert([55,0,1,2] == tal1_uniq([55,0,1,1,2]));
assert([55,0,1] == tal1_uniq([55,55,0,0,0,0,0,0,1,1,1,1]));
assert([55,0] == tal1_uniq([55,0,0,0,0,0,0,0]));



/**
 * Returns [new items, old index -> new index mapping].
 * No-op version.
 */
function tal1_uniq_remap_v1(items) =
	["list-remap-result", items, [for (vi=[0:1:len(items)-1]) vi]];

// [a, a, b, b, c, c]
//
// [a,    ...], []  -> [a],[0]
// [a, a, ...], [0] -> [a],[0,0]

assert([1,2,3] == [1,2,3]);

/**
 * Recursive version that will combine adjacent identical vertexes,
 * but will use the original items.
 */
function tal1_uniq_remap_v2(items, map=[]) =
	let(index = len(map))
	len(items) == index ? ["list-remap-result", items, map] :
	index == 0 ? tal1_uniq_remap_v2(items, [0]) :
	items[index] == items[map[index-1]] ? tal1_uniq_remap_v2(items, [for(vi=map) vi, map[index-1]]) :
	tal1_uniq_remap_v2(items, [for(vi=map) vi, index]);

assert(tal1_uniq_remap_v2([1,1,2,2,3,4]) == ["list-remap-result", [1,1,2,2,3,4], [0,0,2,2,4,5]]);


/**
 * Returns true if `vec` is a list of at least min_len items
 * and component_check(each item, even those beyond min_len) is true.
 */
function tal1_is_vec_of(vec, min_len=0, component_check=function(x) true) =
	assert(is_num(min_len) && min_len >= 0)
	assert(is_function(component_check))
	is_list(vec) && len(vec) >= min_len &&
	tal1_reduce(true, vec, function(prev,item) prev && component_check(item));

function tal1_is_vec_of_num(vec, min_len=0) = tal1_is_vec_of(vec, min_len, function(i) is_num(i));

assert( true == tal1_is_vec_of_num([1,2,3]));
assert( true == tal1_is_vec_of_num([]));
assert( true == tal1_is_vec_of_num([1,2,3], 3));
assert(false == tal1_is_vec_of_num([1,2], 3));
assert(false == tal1_is_vec_of_num([1,2,"spoon"], 3));
// Requirements are ambiguous when
// first min_len items are numbers, but there are non-numeric items afterwards,
// so let's error on the side of saying 'no, it's not a list of numbers';
// i.e. the item check and the min_len are independent.
assert(false == tal1_is_vec_of_num([1,2,3,"artichoke"], 3));


/**
 * Asserts that item_checker(each item in list, index of item)[0] is true.
 * Second element of item_checker return value is assertion message.
 * Returns the original list, in case that's useful to you.
 */
function tal1_assert_for_each(list, item_checker) =
	let( _ignored = [ for(i=[0:1:len(list)-1])
		let(q=item_checker(list[i],i))
		let(passed=is_bool(q) ? q : is_list(q) ? q[0] : assert(false, str(
			"tal1_assert_for_each: item_checker should return Bool|[Bool,String], but returned ",
			q, " for item at index ", i)))
		let(message=is_list(q) ? q[1] : undef)
		assert(passed, message)
		q
	])
	list;

// Callback can return a boolean...
assert([1,2,3] == tal1_assert_for_each([1,2,3], function(v,i) is_num(v)));
// ...or a [boolean, string]
assert([1,2,3] == tal1_assert_for_each([1,2,3], function(v,i) [is_num(v), "element be a num"]));

// [a, b, c] -> [a, b, c, rxf(c), rxf(b), rxf(a)]
function tal1_duplicate_reversed(list, rxf=function(item) item) =
	[
		each list,
		for( i=[len(list)-1 : -1 : 0] ) rxf(list[i]),
	];
// file: ../lib/TOGUnits1.scad
// TOGUnits1.7
// 
// For simlifying quantity parsing and unit conversion
// 
// v1.1:
// - Add `togunits1_decode` function
// v1.2:
// - Add togunits1_decode_vec
// v1.3:
// - Add togunits1_vec_to_cas
// v1.4:
// - Add togunits1_vec_to_mms
// v1.5:
// - Remove unused `unit` parameter from `togunits1_vec_to_cas`
// v1.6:
// - togunits1_decode accepts `xf` parameter, same as togunits1_decode_vec
// v1.7:
// - Add optional 'dbgctxstr' parameter to unit decoding functions, for better error messages
// 
// Reserved but not-yet-actually-used globals:
// - $togunits1_default_unit - default unit when interpreting "0"
//   - See TOGStringLib1
// - $togunits1_default_implied_unit - when interpreting quantities without unit, assume they have this one
//   - This might be a bad idea, so never implemented!

use <./DbgCtxStrLib1.scad>
use <./TOGridLib3.scad>
use <./TOGStringLib1.scad>

function togunits1__is_ca(what) =
	is_list(what) && len(what) == 2 && is_num(what[0]) && is_string(what[1]);

function togunits1__parse_to_ca(what, dbgctxstr=undef) =
	assert( is_string(what) )
	let( parseresult = togstr1_parse_quantity(what, dbgctxstr) )
	assert( parseresult[1] > 0, str("Failed to parse quantity from  ", what, dbgctxstr=dbgctxstr) )
	let( parsed = parseresult[0] )
	let( rat = parsed[0] )
	let( unit = parsed[1] )
	[rat[0]/rat[1], unit];

function togunits1_to_ca(what, dbgctxstr=undef) =
	is_string(what) ? togunits1__parse_to_ca(what, dbgctxstr=dbgctxstr) :
	togunits1__is_ca(what) ? what :
	is_num(what) ? [what, "mm"] :
	assert(false, str("Unrecognized quantity representation: ", what));

function togunits1_vec_to_cas(whats) =
	[for(w=whats) togunits1_to_ca(w)];

function togunits1__get_transform(name) =
	is_function(name) ? name :
	is_undef(name) ? function(n) n :
	name == "round" ? function(n) round(n) :
	name == "ceil" ? function(n) ceil(n) :
	assert(false, str("Unrecognized transform: '", name, "'"));

function togunits1_decode(what, unit=[1,"mm"], xf=undef, dbgctxstr=undef) =
	let( ca = togunits1_to_ca(what, dbgctxstr=dbgctxstr) )
	let( xf1 = togunits1__get_transform(xf) )
	xf1(togridlib3_decode(ca, unit=togunits1_to_ca(unit), dbgctxstr=dbgctxstr));

function togunits1_decode_vec(whats, unit=[1,"mm"], xf=undef) =
	let( unit_ca = togunits1_to_ca(unit) )
	let( xf1 = togunits1__get_transform(xf) )
	[for(w=whats) xf1(togunits1_decode(w, unit_ca))];

function togunits1_to_mm(what, dbgctxstr=undef) = togunits1_decode(what, [1,"mm"], dbgctxstr=dbgctxstr);
function togunits1_vec_to_mms(what) = togunits1_decode_vec(what, [1,"mm"]);
// file: ../lib/TOGMod1.scad
// TOGMod1.9
// OpenSCAD library for representing shapes
// 
// See also: Functional OpenSCAD (https://github.com/thehans/FunctionalOpenSCAD)
// 
// v1.8:
// - Add `text-tsfhvsdls`
// v1.9
// - Add `offset-ds` (offset with _d_elta a _s_hape)

module togmod1_domodule(mod) {
	assert(is_list(mod));
	assert(len(mod) > 0);
	if( mod[0] == "polygon-vp" ) {
		// ["polygon-vp", vertexes, paths]
		polygon(points=mod[1], paths=mod[2]);
	} else if( mod[0] == "polyhedron-vf" ) {
		polyhedron(mod[1], faces=mod[2]);
	} else if( mod[0] == "scale" ) {
		assert(len(mod) == 3);
		scale(mod[1]) togmod1_domodule(mod[2]);
	} else if( mod[0] == "translate" ) {
		assert(len(mod) == 3);
		assert(is_list(mod[1]));
		for(c=mod[1]) assert(is_num(c), "translate component should be numeric");
		translate(mod[1]) togmod1_domodule(mod[2]);
	} else if( mod[0] == "rotate" ) {
		assert(len(mod) == 3);
		rotate(mod[1]) togmod1_domodule(mod[2]);
	} else if( mod[0] == "intersection" ) {
		intersection_for( i=[1:1:len(mod)-1] ) togmod1_domodule(mod[i]);
	} else if( mod[0] == "difference" ) {
		difference() {
			togmod1_domodule(mod[1]);
			for( i=[2:1:len(mod)-1] ) togmod1_domodule(mod[i]);
		}
	} else if( mod[0] == "union" ) {
		for( i=[1:1:len(mod)-1] ) togmod1_domodule(mod[i]);
	} else if( mod[0] == "hull" ) {
		hull() for( i=[1:1:len(mod)-1] ) togmod1_domodule(mod[i]);
	} else if( mod[0] == "offset-rs" ) {
		assert(len(mod) == 3);
		assert(is_num(mod[1]));
		assert(is_list(mod[2]));
		offset(mod[1]) togmod1_domodule(mod[2]);
	} else if( mod[0] == "linear-extrude-zs" ) {
		// ["linear-extrude-zs", [z0,z1], 2d_shape] // centered
		// ["linear-extrude-zs", height, 2d_shape]
		let( zrange = is_list(mod[1]) ? mod[1] : [-mod[1]/2, mod[1]/2] ) {
			translate([0,0,zrange[0]]) linear_extrude(zrange[1]-zrange[0]) togmod1_domodule(mod[2]);
		}
	} else if( mod[0] == "render" ) {
		render() togmod1_domodule(mod[1]);
	} else if( mod[0] == "minkowski" ) {
		minkowski() {
			togmod1_domodule(mod[1]);
			togmod1_domodule(mod[2]);
		}
	} else if( mod[0] == "x-debug" ) {
		# togmod1_domodule(mod[1]);
	} else if( mod[0] == "x-color" ) {
		color(mod[1]) togmod1_domodule(mod[2]);
	} else if( mod[0] == "text-tsfhvsdls" ) {
		text(text=mod[1], size=mod[2], font=mod[3], halign=mod[4], valign=mod[5], spacing=mod[6], direction=mod[7], language=mod[7], script=mod[8]);
	} else if( mod[0] == "offset-ds" ) {
		assert(is_num(mod[1]));
		assert(is_list(mod[2]));
		offset(delta=mod[1]) togmod1_domodule(mod[2]);
	} else {
		assert(false, str("Unrecognized shape: ", mod[0]));
	}
}
// main file
// FlatheadRouterTemplateAdapter1.1
// 
// v1.1:
// - Add bottom_outer_inset option

bushing_hole_diameter = 12.5;
bolt_head_diameter = "1/2inch";
bolt_head_height = "3/16inch";
bolt_diameter  = "1/4inch";
bottom_outer_inset = "0mm";

$fn = 72;

module __amlksdjkansd__end_params() { }

use <../lib/TOGMod1.scad>
use <../lib/TOGPolyhedronLib1.scad>
use <../lib/TOGUnits1.scad>

bushing_hole_diameter_mm = togunits1_to_mm(bushing_hole_diameter);
bolt_head_diameter_mm    = togunits1_to_mm(bolt_head_diameter);
bolt_head_height_mm      = togunits1_to_mm(bolt_head_height);
bolt_diameter_mm         = togunits1_to_mm(bolt_diameter);
bo_inset_mm              = togunits1_to_mm(bottom_outer_inset);

u = togunits1_to_mm("1u");

togmod1_domodule(
	["difference",
		tphl1_make_z_cylinder(zds=[
			[  0, bushing_hole_diameter_mm-2*bo_inset_mm],
			[  u, bushing_hole_diameter_mm    ],
			[2*u, bushing_hole_diameter_mm+2*u]
		]),

		tphl1_make_z_cylinder(zds=[
			[2*u-bolt_head_height_mm-10, bolt_diameter_mm     ],
			[2*u-bolt_head_height_mm   , bolt_diameter_mm     ],
			[2*u                       , bolt_head_diameter_mm],
			[2*u+10                    , bolt_head_diameter_mm],
		]),
	]
);
